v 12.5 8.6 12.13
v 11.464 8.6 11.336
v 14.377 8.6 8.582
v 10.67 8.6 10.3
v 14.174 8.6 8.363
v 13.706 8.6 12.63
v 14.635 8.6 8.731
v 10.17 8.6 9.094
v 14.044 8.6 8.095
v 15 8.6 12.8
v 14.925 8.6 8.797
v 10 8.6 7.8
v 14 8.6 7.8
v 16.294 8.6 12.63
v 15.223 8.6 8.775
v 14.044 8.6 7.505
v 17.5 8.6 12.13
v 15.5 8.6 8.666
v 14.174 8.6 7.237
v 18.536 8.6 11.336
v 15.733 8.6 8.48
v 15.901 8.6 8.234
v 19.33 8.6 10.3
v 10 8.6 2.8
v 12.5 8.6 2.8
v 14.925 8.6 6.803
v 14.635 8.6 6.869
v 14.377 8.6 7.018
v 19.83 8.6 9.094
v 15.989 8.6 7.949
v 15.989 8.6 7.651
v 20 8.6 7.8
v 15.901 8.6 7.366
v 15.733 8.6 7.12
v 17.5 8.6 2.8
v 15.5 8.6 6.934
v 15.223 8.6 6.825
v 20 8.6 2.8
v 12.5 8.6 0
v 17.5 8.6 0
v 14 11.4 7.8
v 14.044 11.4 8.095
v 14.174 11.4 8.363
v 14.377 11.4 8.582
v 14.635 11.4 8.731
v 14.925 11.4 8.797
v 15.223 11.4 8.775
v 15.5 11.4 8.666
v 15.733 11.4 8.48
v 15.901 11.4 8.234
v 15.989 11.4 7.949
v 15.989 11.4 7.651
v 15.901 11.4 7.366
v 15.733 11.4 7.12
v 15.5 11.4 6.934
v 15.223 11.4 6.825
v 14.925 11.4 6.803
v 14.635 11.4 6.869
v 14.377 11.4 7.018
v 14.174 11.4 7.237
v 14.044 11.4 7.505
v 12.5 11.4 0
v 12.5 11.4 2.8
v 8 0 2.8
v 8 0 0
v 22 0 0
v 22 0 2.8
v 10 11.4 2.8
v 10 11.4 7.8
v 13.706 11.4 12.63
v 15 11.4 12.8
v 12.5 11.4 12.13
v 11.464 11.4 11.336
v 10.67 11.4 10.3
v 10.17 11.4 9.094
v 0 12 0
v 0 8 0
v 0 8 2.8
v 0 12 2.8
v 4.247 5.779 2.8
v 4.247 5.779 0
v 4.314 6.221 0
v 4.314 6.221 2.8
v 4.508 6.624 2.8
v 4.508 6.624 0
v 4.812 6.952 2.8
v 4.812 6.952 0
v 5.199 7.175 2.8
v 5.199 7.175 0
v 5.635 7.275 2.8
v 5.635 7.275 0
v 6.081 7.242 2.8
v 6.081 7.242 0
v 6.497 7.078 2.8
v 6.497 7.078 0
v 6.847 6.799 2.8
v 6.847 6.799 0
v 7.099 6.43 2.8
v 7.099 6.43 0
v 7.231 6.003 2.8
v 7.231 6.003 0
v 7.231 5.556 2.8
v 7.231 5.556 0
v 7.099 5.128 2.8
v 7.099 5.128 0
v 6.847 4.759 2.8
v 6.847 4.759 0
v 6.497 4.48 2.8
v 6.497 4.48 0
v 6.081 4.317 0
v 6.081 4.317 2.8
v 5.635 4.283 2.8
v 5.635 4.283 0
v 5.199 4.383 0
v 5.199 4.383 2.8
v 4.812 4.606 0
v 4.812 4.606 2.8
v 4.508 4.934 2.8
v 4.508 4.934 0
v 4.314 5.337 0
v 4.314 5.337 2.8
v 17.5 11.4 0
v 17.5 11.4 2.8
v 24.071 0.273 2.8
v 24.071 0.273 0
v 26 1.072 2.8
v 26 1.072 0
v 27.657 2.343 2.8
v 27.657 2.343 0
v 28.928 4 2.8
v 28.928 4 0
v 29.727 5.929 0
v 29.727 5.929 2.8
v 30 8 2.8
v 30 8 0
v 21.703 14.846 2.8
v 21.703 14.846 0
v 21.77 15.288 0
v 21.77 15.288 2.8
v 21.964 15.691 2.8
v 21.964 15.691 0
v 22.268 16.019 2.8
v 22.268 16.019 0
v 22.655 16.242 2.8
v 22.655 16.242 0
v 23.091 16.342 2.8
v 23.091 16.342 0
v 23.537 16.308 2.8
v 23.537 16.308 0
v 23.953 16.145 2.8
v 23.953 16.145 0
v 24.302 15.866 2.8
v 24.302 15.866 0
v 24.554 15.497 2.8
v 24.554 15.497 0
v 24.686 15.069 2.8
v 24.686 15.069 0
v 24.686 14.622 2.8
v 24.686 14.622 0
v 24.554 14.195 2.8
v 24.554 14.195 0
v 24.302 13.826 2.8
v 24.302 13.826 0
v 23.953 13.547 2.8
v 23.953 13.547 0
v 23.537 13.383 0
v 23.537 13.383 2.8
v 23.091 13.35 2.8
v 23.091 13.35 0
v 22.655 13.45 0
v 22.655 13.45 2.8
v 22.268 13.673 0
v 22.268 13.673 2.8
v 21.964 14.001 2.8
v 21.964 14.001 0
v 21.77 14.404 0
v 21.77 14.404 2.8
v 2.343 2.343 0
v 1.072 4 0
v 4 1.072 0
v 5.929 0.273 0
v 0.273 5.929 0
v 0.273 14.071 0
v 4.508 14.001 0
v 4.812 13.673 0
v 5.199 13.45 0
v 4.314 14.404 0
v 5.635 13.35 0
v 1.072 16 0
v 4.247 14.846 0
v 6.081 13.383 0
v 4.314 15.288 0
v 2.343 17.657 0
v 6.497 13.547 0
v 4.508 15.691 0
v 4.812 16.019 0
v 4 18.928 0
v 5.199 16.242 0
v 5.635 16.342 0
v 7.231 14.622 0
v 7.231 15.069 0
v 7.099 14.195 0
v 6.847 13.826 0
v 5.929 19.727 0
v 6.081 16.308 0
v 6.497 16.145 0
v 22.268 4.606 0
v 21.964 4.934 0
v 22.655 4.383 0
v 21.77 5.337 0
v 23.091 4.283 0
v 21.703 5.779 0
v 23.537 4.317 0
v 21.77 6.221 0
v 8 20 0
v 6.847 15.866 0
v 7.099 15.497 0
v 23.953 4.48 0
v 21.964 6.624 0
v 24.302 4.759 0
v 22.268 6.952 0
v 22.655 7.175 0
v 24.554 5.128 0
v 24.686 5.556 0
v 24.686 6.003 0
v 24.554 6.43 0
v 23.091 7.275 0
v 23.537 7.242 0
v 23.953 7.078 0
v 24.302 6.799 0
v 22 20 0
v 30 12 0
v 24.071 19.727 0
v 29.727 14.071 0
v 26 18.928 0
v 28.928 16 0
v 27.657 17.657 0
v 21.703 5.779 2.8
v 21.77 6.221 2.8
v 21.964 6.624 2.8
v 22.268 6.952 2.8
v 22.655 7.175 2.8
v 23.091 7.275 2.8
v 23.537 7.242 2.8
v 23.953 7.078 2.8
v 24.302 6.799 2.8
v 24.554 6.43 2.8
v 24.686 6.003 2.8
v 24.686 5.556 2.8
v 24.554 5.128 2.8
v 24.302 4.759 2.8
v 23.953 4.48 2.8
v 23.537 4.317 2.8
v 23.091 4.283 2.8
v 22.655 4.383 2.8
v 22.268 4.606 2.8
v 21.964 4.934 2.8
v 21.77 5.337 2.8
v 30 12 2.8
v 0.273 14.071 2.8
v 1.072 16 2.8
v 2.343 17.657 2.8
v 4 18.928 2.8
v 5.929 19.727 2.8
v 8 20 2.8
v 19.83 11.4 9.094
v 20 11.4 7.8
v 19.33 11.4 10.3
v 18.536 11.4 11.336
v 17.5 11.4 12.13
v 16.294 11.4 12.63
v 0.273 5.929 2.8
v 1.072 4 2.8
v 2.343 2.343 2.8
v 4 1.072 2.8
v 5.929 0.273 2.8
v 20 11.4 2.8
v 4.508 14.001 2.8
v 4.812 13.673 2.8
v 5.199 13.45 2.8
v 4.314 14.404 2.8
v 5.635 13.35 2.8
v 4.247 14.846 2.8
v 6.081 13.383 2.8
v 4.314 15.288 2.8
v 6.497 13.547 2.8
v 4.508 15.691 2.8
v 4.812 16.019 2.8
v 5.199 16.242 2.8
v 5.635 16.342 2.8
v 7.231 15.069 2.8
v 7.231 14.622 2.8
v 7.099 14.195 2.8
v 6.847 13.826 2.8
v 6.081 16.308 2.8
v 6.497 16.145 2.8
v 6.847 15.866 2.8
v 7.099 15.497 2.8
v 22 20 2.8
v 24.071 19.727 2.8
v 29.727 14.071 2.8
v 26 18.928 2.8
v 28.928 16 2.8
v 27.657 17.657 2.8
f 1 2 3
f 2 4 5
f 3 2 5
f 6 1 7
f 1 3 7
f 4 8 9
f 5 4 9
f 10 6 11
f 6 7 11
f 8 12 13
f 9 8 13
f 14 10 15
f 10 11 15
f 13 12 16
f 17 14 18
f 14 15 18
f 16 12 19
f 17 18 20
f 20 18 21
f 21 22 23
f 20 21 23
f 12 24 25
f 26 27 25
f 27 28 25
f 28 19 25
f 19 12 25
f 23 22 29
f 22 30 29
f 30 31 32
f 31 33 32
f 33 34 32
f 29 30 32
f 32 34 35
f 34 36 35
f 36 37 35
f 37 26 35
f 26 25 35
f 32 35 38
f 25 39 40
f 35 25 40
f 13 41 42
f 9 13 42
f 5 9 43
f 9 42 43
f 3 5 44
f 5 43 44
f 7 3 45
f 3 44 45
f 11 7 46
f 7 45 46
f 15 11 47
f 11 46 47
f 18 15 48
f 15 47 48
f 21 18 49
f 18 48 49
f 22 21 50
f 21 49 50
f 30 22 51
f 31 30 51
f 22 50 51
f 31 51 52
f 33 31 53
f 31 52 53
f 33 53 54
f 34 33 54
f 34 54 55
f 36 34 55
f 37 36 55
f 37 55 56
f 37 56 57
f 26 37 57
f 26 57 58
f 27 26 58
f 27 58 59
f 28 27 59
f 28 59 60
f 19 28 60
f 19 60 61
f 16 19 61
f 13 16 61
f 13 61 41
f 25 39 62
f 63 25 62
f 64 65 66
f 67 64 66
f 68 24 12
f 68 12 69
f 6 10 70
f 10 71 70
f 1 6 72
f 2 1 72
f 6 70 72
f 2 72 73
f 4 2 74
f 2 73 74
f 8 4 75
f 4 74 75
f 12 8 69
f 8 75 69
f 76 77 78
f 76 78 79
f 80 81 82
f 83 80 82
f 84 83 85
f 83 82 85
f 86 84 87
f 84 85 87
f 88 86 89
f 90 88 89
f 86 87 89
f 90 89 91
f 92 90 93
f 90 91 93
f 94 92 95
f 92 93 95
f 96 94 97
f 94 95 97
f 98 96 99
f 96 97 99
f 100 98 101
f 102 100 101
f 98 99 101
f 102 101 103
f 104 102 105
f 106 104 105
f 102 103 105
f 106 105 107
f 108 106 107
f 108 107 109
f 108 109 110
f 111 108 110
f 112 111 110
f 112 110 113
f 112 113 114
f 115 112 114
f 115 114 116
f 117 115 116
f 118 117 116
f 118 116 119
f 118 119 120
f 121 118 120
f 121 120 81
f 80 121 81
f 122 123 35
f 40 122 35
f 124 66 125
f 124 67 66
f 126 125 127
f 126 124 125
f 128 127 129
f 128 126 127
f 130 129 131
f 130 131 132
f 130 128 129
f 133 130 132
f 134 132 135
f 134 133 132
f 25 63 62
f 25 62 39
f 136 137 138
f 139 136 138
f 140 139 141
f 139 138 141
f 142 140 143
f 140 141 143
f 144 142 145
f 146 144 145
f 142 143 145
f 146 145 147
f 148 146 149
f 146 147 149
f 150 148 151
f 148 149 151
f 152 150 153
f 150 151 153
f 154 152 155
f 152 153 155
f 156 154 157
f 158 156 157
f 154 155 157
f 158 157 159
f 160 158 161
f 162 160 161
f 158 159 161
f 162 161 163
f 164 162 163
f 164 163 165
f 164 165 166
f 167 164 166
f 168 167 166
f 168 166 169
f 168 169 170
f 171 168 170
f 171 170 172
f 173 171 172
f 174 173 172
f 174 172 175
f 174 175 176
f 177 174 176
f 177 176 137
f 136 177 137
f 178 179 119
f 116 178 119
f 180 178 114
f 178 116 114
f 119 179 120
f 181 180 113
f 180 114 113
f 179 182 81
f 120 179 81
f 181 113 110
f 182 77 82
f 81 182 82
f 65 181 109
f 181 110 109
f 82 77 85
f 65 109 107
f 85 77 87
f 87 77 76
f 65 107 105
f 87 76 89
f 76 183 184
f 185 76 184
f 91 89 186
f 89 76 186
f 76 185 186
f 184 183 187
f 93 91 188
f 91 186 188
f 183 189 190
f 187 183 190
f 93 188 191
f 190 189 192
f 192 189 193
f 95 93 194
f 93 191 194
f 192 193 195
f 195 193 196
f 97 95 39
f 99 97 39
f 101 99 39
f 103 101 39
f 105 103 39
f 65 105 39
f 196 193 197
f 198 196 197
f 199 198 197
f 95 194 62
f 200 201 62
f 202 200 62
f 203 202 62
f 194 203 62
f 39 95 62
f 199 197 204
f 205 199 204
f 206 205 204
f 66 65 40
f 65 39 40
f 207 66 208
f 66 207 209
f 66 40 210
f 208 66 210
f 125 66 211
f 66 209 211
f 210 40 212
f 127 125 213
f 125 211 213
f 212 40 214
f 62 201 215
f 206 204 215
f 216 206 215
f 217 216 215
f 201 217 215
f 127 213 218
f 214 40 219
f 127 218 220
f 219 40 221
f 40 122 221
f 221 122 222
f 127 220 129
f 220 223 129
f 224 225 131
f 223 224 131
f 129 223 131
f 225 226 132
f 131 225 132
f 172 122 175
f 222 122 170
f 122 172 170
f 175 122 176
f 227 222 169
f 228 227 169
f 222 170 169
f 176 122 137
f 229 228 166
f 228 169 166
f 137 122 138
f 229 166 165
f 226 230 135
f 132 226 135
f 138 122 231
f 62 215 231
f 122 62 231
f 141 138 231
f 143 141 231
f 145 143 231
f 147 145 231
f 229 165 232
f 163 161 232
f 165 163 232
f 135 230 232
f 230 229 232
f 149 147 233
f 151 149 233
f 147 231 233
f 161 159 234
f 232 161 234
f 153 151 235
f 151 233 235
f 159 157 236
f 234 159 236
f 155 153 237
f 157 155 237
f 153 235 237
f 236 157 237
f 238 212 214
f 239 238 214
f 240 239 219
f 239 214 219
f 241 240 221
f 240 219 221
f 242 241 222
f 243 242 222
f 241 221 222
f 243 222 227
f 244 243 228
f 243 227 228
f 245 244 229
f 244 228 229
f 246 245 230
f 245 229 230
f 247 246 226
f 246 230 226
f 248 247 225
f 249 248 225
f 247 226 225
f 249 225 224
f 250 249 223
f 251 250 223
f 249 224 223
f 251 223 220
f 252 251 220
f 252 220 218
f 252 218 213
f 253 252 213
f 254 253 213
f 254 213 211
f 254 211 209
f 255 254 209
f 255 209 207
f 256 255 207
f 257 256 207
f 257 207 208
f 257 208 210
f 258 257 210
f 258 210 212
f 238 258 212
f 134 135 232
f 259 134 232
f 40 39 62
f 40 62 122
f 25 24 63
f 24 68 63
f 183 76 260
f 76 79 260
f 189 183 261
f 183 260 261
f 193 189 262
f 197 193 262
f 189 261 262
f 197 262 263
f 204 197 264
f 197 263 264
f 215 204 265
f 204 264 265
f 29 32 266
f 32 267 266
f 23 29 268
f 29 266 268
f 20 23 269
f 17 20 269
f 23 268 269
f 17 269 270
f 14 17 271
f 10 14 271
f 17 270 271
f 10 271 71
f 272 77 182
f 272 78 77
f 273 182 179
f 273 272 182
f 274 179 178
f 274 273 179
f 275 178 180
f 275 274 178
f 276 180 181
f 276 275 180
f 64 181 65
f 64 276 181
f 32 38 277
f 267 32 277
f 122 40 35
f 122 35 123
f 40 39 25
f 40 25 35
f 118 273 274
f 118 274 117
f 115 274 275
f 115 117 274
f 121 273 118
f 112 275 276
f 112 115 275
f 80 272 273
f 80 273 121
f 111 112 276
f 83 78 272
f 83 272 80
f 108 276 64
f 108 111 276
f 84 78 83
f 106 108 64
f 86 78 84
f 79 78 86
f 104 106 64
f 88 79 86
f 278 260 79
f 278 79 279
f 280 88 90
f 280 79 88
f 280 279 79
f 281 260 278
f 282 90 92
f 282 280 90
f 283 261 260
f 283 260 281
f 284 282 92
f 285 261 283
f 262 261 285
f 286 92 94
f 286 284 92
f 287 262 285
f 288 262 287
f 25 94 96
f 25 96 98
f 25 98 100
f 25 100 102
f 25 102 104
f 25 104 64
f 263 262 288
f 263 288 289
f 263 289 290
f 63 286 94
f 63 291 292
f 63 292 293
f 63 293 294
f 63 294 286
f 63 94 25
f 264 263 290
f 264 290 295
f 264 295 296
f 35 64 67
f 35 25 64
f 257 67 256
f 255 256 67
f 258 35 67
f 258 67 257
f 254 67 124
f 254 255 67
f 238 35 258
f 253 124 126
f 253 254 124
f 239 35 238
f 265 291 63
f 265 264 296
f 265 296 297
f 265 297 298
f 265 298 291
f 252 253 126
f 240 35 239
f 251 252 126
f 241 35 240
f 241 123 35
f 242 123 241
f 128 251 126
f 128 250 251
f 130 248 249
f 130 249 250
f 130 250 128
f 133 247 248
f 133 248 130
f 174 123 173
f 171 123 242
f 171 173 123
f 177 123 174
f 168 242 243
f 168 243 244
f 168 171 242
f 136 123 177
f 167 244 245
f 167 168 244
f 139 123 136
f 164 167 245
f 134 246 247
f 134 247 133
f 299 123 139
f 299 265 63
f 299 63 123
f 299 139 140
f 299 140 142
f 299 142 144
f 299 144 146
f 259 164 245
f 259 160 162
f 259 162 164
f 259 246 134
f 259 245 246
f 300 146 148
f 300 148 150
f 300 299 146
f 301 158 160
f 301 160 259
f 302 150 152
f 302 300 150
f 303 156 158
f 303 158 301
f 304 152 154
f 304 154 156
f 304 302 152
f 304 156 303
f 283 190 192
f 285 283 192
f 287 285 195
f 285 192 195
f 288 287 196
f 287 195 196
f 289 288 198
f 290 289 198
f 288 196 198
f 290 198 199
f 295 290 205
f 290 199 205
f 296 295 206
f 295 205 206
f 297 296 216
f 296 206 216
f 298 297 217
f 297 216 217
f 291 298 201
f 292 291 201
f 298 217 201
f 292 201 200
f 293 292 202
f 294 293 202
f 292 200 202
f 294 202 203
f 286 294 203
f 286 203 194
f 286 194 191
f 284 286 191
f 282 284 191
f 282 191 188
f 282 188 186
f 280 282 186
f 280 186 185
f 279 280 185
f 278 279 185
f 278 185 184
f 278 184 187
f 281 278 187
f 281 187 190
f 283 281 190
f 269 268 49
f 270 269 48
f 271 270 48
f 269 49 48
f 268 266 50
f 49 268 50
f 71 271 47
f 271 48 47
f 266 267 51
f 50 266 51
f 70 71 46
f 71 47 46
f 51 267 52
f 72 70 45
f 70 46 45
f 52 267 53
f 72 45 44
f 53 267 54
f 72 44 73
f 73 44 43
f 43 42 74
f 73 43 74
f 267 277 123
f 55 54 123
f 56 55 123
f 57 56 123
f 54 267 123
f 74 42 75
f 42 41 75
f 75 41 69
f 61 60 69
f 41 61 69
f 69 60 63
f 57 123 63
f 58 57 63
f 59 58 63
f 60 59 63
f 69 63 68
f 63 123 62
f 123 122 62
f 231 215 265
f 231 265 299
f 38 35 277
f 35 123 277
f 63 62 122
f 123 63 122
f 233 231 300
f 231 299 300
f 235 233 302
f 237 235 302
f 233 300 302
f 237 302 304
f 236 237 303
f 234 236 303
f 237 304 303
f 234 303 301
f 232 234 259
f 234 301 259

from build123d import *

# Parameters (mm, degrees)
F0_W     = 30
F0_H     = 20
F0_W_2   = 5
F0_H_2   = 2.8
F1_DEPTH = 2.8
F2_W     = 2.5
F2_H     = 2.8
F2_W_2   = 5
F3_DEPTH = 10
F5_D     = 2
F6_R     = 4.99999
F7_W     = 5
F7_H     = 2.8
F8_DEPTH = 2.8
F9_R     = 8
F11_D    = 3


# Not quite as in the source:
# - a fillet or chamfer is up to 0.001 mm smaller than in the source, because OpenCascade refuses the exact size


with BuildPart() as f1:
    # F0 (on Top) → F1 (new body)
    with BuildSketch(Plane.XY):
        with Locations((15, 10)):
            Rectangle(F0_W, F0_H)
        with Locations((15, 10)):
            Rectangle(F0_W_2, F0_H_2, mode=Mode.SUBTRACT)
    extrude(amount=F1_DEPTH)

    # F9
    f9_edges = [f1.edges().sort_by_distance(p)[0] for p in [
        (30, 20, 1.4),
        (0, 20, 1.4),
        (30, 0, 1.4),
        (0, 0, 1.4),
    ]]
    fillet(f9_edges, radius=F9_R)

    # F11 (through all)
    with Locations(Plane.XY.offset(2.8)):
        with Locations((5.7473420165, 14.8458313197), (23.2028886676, 14.8458313197), (23.2028886676, 5.7791140862), (5.7473420165, 5.7791140862)):
            Hole(F11_D / 2)


with BuildPart() as f3:
    # F2 (on face) → F3 (new body)
    with BuildSketch(Plane.XY.offset(2.8)):
        with Locations((18.75, 10)):
            Rectangle(F2_W, F2_H)
        with Locations((15, 10)):
            Rectangle(F2_W_2, F2_H)
        with Locations((11.25, 10)):
            Rectangle(F2_W, F2_H)
    extrude(amount=F3_DEPTH)

    # F5 (through all)
    with Locations(Plane.XZ.offset(-8.6)):
        with Locations((15, 7.8)):
            Hole(F5_D / 2)

    # F6 (radius 5 in the source; OpenCascade refuses exactly that, so slightly less here)
    f6_edges = [f3.edges().sort_by_distance(p)[0] for p in [
        (10, 10, 12.8),
        (20, 10, 12.8),
    ]]
    fillet(f6_edges, radius=F6_R)

    # F7 (on face) → F8 (join)
    with BuildSketch(Plane(origin=(0, 0, 2.8), x_dir=(1, 0, 0), z_dir=(0, 0, -1))):
        with Locations((15, -10)):
            Rectangle(F7_W, F7_H)
    extrude(amount=F8_DEPTH)


solid = Compound([f1.part, f3.part])
